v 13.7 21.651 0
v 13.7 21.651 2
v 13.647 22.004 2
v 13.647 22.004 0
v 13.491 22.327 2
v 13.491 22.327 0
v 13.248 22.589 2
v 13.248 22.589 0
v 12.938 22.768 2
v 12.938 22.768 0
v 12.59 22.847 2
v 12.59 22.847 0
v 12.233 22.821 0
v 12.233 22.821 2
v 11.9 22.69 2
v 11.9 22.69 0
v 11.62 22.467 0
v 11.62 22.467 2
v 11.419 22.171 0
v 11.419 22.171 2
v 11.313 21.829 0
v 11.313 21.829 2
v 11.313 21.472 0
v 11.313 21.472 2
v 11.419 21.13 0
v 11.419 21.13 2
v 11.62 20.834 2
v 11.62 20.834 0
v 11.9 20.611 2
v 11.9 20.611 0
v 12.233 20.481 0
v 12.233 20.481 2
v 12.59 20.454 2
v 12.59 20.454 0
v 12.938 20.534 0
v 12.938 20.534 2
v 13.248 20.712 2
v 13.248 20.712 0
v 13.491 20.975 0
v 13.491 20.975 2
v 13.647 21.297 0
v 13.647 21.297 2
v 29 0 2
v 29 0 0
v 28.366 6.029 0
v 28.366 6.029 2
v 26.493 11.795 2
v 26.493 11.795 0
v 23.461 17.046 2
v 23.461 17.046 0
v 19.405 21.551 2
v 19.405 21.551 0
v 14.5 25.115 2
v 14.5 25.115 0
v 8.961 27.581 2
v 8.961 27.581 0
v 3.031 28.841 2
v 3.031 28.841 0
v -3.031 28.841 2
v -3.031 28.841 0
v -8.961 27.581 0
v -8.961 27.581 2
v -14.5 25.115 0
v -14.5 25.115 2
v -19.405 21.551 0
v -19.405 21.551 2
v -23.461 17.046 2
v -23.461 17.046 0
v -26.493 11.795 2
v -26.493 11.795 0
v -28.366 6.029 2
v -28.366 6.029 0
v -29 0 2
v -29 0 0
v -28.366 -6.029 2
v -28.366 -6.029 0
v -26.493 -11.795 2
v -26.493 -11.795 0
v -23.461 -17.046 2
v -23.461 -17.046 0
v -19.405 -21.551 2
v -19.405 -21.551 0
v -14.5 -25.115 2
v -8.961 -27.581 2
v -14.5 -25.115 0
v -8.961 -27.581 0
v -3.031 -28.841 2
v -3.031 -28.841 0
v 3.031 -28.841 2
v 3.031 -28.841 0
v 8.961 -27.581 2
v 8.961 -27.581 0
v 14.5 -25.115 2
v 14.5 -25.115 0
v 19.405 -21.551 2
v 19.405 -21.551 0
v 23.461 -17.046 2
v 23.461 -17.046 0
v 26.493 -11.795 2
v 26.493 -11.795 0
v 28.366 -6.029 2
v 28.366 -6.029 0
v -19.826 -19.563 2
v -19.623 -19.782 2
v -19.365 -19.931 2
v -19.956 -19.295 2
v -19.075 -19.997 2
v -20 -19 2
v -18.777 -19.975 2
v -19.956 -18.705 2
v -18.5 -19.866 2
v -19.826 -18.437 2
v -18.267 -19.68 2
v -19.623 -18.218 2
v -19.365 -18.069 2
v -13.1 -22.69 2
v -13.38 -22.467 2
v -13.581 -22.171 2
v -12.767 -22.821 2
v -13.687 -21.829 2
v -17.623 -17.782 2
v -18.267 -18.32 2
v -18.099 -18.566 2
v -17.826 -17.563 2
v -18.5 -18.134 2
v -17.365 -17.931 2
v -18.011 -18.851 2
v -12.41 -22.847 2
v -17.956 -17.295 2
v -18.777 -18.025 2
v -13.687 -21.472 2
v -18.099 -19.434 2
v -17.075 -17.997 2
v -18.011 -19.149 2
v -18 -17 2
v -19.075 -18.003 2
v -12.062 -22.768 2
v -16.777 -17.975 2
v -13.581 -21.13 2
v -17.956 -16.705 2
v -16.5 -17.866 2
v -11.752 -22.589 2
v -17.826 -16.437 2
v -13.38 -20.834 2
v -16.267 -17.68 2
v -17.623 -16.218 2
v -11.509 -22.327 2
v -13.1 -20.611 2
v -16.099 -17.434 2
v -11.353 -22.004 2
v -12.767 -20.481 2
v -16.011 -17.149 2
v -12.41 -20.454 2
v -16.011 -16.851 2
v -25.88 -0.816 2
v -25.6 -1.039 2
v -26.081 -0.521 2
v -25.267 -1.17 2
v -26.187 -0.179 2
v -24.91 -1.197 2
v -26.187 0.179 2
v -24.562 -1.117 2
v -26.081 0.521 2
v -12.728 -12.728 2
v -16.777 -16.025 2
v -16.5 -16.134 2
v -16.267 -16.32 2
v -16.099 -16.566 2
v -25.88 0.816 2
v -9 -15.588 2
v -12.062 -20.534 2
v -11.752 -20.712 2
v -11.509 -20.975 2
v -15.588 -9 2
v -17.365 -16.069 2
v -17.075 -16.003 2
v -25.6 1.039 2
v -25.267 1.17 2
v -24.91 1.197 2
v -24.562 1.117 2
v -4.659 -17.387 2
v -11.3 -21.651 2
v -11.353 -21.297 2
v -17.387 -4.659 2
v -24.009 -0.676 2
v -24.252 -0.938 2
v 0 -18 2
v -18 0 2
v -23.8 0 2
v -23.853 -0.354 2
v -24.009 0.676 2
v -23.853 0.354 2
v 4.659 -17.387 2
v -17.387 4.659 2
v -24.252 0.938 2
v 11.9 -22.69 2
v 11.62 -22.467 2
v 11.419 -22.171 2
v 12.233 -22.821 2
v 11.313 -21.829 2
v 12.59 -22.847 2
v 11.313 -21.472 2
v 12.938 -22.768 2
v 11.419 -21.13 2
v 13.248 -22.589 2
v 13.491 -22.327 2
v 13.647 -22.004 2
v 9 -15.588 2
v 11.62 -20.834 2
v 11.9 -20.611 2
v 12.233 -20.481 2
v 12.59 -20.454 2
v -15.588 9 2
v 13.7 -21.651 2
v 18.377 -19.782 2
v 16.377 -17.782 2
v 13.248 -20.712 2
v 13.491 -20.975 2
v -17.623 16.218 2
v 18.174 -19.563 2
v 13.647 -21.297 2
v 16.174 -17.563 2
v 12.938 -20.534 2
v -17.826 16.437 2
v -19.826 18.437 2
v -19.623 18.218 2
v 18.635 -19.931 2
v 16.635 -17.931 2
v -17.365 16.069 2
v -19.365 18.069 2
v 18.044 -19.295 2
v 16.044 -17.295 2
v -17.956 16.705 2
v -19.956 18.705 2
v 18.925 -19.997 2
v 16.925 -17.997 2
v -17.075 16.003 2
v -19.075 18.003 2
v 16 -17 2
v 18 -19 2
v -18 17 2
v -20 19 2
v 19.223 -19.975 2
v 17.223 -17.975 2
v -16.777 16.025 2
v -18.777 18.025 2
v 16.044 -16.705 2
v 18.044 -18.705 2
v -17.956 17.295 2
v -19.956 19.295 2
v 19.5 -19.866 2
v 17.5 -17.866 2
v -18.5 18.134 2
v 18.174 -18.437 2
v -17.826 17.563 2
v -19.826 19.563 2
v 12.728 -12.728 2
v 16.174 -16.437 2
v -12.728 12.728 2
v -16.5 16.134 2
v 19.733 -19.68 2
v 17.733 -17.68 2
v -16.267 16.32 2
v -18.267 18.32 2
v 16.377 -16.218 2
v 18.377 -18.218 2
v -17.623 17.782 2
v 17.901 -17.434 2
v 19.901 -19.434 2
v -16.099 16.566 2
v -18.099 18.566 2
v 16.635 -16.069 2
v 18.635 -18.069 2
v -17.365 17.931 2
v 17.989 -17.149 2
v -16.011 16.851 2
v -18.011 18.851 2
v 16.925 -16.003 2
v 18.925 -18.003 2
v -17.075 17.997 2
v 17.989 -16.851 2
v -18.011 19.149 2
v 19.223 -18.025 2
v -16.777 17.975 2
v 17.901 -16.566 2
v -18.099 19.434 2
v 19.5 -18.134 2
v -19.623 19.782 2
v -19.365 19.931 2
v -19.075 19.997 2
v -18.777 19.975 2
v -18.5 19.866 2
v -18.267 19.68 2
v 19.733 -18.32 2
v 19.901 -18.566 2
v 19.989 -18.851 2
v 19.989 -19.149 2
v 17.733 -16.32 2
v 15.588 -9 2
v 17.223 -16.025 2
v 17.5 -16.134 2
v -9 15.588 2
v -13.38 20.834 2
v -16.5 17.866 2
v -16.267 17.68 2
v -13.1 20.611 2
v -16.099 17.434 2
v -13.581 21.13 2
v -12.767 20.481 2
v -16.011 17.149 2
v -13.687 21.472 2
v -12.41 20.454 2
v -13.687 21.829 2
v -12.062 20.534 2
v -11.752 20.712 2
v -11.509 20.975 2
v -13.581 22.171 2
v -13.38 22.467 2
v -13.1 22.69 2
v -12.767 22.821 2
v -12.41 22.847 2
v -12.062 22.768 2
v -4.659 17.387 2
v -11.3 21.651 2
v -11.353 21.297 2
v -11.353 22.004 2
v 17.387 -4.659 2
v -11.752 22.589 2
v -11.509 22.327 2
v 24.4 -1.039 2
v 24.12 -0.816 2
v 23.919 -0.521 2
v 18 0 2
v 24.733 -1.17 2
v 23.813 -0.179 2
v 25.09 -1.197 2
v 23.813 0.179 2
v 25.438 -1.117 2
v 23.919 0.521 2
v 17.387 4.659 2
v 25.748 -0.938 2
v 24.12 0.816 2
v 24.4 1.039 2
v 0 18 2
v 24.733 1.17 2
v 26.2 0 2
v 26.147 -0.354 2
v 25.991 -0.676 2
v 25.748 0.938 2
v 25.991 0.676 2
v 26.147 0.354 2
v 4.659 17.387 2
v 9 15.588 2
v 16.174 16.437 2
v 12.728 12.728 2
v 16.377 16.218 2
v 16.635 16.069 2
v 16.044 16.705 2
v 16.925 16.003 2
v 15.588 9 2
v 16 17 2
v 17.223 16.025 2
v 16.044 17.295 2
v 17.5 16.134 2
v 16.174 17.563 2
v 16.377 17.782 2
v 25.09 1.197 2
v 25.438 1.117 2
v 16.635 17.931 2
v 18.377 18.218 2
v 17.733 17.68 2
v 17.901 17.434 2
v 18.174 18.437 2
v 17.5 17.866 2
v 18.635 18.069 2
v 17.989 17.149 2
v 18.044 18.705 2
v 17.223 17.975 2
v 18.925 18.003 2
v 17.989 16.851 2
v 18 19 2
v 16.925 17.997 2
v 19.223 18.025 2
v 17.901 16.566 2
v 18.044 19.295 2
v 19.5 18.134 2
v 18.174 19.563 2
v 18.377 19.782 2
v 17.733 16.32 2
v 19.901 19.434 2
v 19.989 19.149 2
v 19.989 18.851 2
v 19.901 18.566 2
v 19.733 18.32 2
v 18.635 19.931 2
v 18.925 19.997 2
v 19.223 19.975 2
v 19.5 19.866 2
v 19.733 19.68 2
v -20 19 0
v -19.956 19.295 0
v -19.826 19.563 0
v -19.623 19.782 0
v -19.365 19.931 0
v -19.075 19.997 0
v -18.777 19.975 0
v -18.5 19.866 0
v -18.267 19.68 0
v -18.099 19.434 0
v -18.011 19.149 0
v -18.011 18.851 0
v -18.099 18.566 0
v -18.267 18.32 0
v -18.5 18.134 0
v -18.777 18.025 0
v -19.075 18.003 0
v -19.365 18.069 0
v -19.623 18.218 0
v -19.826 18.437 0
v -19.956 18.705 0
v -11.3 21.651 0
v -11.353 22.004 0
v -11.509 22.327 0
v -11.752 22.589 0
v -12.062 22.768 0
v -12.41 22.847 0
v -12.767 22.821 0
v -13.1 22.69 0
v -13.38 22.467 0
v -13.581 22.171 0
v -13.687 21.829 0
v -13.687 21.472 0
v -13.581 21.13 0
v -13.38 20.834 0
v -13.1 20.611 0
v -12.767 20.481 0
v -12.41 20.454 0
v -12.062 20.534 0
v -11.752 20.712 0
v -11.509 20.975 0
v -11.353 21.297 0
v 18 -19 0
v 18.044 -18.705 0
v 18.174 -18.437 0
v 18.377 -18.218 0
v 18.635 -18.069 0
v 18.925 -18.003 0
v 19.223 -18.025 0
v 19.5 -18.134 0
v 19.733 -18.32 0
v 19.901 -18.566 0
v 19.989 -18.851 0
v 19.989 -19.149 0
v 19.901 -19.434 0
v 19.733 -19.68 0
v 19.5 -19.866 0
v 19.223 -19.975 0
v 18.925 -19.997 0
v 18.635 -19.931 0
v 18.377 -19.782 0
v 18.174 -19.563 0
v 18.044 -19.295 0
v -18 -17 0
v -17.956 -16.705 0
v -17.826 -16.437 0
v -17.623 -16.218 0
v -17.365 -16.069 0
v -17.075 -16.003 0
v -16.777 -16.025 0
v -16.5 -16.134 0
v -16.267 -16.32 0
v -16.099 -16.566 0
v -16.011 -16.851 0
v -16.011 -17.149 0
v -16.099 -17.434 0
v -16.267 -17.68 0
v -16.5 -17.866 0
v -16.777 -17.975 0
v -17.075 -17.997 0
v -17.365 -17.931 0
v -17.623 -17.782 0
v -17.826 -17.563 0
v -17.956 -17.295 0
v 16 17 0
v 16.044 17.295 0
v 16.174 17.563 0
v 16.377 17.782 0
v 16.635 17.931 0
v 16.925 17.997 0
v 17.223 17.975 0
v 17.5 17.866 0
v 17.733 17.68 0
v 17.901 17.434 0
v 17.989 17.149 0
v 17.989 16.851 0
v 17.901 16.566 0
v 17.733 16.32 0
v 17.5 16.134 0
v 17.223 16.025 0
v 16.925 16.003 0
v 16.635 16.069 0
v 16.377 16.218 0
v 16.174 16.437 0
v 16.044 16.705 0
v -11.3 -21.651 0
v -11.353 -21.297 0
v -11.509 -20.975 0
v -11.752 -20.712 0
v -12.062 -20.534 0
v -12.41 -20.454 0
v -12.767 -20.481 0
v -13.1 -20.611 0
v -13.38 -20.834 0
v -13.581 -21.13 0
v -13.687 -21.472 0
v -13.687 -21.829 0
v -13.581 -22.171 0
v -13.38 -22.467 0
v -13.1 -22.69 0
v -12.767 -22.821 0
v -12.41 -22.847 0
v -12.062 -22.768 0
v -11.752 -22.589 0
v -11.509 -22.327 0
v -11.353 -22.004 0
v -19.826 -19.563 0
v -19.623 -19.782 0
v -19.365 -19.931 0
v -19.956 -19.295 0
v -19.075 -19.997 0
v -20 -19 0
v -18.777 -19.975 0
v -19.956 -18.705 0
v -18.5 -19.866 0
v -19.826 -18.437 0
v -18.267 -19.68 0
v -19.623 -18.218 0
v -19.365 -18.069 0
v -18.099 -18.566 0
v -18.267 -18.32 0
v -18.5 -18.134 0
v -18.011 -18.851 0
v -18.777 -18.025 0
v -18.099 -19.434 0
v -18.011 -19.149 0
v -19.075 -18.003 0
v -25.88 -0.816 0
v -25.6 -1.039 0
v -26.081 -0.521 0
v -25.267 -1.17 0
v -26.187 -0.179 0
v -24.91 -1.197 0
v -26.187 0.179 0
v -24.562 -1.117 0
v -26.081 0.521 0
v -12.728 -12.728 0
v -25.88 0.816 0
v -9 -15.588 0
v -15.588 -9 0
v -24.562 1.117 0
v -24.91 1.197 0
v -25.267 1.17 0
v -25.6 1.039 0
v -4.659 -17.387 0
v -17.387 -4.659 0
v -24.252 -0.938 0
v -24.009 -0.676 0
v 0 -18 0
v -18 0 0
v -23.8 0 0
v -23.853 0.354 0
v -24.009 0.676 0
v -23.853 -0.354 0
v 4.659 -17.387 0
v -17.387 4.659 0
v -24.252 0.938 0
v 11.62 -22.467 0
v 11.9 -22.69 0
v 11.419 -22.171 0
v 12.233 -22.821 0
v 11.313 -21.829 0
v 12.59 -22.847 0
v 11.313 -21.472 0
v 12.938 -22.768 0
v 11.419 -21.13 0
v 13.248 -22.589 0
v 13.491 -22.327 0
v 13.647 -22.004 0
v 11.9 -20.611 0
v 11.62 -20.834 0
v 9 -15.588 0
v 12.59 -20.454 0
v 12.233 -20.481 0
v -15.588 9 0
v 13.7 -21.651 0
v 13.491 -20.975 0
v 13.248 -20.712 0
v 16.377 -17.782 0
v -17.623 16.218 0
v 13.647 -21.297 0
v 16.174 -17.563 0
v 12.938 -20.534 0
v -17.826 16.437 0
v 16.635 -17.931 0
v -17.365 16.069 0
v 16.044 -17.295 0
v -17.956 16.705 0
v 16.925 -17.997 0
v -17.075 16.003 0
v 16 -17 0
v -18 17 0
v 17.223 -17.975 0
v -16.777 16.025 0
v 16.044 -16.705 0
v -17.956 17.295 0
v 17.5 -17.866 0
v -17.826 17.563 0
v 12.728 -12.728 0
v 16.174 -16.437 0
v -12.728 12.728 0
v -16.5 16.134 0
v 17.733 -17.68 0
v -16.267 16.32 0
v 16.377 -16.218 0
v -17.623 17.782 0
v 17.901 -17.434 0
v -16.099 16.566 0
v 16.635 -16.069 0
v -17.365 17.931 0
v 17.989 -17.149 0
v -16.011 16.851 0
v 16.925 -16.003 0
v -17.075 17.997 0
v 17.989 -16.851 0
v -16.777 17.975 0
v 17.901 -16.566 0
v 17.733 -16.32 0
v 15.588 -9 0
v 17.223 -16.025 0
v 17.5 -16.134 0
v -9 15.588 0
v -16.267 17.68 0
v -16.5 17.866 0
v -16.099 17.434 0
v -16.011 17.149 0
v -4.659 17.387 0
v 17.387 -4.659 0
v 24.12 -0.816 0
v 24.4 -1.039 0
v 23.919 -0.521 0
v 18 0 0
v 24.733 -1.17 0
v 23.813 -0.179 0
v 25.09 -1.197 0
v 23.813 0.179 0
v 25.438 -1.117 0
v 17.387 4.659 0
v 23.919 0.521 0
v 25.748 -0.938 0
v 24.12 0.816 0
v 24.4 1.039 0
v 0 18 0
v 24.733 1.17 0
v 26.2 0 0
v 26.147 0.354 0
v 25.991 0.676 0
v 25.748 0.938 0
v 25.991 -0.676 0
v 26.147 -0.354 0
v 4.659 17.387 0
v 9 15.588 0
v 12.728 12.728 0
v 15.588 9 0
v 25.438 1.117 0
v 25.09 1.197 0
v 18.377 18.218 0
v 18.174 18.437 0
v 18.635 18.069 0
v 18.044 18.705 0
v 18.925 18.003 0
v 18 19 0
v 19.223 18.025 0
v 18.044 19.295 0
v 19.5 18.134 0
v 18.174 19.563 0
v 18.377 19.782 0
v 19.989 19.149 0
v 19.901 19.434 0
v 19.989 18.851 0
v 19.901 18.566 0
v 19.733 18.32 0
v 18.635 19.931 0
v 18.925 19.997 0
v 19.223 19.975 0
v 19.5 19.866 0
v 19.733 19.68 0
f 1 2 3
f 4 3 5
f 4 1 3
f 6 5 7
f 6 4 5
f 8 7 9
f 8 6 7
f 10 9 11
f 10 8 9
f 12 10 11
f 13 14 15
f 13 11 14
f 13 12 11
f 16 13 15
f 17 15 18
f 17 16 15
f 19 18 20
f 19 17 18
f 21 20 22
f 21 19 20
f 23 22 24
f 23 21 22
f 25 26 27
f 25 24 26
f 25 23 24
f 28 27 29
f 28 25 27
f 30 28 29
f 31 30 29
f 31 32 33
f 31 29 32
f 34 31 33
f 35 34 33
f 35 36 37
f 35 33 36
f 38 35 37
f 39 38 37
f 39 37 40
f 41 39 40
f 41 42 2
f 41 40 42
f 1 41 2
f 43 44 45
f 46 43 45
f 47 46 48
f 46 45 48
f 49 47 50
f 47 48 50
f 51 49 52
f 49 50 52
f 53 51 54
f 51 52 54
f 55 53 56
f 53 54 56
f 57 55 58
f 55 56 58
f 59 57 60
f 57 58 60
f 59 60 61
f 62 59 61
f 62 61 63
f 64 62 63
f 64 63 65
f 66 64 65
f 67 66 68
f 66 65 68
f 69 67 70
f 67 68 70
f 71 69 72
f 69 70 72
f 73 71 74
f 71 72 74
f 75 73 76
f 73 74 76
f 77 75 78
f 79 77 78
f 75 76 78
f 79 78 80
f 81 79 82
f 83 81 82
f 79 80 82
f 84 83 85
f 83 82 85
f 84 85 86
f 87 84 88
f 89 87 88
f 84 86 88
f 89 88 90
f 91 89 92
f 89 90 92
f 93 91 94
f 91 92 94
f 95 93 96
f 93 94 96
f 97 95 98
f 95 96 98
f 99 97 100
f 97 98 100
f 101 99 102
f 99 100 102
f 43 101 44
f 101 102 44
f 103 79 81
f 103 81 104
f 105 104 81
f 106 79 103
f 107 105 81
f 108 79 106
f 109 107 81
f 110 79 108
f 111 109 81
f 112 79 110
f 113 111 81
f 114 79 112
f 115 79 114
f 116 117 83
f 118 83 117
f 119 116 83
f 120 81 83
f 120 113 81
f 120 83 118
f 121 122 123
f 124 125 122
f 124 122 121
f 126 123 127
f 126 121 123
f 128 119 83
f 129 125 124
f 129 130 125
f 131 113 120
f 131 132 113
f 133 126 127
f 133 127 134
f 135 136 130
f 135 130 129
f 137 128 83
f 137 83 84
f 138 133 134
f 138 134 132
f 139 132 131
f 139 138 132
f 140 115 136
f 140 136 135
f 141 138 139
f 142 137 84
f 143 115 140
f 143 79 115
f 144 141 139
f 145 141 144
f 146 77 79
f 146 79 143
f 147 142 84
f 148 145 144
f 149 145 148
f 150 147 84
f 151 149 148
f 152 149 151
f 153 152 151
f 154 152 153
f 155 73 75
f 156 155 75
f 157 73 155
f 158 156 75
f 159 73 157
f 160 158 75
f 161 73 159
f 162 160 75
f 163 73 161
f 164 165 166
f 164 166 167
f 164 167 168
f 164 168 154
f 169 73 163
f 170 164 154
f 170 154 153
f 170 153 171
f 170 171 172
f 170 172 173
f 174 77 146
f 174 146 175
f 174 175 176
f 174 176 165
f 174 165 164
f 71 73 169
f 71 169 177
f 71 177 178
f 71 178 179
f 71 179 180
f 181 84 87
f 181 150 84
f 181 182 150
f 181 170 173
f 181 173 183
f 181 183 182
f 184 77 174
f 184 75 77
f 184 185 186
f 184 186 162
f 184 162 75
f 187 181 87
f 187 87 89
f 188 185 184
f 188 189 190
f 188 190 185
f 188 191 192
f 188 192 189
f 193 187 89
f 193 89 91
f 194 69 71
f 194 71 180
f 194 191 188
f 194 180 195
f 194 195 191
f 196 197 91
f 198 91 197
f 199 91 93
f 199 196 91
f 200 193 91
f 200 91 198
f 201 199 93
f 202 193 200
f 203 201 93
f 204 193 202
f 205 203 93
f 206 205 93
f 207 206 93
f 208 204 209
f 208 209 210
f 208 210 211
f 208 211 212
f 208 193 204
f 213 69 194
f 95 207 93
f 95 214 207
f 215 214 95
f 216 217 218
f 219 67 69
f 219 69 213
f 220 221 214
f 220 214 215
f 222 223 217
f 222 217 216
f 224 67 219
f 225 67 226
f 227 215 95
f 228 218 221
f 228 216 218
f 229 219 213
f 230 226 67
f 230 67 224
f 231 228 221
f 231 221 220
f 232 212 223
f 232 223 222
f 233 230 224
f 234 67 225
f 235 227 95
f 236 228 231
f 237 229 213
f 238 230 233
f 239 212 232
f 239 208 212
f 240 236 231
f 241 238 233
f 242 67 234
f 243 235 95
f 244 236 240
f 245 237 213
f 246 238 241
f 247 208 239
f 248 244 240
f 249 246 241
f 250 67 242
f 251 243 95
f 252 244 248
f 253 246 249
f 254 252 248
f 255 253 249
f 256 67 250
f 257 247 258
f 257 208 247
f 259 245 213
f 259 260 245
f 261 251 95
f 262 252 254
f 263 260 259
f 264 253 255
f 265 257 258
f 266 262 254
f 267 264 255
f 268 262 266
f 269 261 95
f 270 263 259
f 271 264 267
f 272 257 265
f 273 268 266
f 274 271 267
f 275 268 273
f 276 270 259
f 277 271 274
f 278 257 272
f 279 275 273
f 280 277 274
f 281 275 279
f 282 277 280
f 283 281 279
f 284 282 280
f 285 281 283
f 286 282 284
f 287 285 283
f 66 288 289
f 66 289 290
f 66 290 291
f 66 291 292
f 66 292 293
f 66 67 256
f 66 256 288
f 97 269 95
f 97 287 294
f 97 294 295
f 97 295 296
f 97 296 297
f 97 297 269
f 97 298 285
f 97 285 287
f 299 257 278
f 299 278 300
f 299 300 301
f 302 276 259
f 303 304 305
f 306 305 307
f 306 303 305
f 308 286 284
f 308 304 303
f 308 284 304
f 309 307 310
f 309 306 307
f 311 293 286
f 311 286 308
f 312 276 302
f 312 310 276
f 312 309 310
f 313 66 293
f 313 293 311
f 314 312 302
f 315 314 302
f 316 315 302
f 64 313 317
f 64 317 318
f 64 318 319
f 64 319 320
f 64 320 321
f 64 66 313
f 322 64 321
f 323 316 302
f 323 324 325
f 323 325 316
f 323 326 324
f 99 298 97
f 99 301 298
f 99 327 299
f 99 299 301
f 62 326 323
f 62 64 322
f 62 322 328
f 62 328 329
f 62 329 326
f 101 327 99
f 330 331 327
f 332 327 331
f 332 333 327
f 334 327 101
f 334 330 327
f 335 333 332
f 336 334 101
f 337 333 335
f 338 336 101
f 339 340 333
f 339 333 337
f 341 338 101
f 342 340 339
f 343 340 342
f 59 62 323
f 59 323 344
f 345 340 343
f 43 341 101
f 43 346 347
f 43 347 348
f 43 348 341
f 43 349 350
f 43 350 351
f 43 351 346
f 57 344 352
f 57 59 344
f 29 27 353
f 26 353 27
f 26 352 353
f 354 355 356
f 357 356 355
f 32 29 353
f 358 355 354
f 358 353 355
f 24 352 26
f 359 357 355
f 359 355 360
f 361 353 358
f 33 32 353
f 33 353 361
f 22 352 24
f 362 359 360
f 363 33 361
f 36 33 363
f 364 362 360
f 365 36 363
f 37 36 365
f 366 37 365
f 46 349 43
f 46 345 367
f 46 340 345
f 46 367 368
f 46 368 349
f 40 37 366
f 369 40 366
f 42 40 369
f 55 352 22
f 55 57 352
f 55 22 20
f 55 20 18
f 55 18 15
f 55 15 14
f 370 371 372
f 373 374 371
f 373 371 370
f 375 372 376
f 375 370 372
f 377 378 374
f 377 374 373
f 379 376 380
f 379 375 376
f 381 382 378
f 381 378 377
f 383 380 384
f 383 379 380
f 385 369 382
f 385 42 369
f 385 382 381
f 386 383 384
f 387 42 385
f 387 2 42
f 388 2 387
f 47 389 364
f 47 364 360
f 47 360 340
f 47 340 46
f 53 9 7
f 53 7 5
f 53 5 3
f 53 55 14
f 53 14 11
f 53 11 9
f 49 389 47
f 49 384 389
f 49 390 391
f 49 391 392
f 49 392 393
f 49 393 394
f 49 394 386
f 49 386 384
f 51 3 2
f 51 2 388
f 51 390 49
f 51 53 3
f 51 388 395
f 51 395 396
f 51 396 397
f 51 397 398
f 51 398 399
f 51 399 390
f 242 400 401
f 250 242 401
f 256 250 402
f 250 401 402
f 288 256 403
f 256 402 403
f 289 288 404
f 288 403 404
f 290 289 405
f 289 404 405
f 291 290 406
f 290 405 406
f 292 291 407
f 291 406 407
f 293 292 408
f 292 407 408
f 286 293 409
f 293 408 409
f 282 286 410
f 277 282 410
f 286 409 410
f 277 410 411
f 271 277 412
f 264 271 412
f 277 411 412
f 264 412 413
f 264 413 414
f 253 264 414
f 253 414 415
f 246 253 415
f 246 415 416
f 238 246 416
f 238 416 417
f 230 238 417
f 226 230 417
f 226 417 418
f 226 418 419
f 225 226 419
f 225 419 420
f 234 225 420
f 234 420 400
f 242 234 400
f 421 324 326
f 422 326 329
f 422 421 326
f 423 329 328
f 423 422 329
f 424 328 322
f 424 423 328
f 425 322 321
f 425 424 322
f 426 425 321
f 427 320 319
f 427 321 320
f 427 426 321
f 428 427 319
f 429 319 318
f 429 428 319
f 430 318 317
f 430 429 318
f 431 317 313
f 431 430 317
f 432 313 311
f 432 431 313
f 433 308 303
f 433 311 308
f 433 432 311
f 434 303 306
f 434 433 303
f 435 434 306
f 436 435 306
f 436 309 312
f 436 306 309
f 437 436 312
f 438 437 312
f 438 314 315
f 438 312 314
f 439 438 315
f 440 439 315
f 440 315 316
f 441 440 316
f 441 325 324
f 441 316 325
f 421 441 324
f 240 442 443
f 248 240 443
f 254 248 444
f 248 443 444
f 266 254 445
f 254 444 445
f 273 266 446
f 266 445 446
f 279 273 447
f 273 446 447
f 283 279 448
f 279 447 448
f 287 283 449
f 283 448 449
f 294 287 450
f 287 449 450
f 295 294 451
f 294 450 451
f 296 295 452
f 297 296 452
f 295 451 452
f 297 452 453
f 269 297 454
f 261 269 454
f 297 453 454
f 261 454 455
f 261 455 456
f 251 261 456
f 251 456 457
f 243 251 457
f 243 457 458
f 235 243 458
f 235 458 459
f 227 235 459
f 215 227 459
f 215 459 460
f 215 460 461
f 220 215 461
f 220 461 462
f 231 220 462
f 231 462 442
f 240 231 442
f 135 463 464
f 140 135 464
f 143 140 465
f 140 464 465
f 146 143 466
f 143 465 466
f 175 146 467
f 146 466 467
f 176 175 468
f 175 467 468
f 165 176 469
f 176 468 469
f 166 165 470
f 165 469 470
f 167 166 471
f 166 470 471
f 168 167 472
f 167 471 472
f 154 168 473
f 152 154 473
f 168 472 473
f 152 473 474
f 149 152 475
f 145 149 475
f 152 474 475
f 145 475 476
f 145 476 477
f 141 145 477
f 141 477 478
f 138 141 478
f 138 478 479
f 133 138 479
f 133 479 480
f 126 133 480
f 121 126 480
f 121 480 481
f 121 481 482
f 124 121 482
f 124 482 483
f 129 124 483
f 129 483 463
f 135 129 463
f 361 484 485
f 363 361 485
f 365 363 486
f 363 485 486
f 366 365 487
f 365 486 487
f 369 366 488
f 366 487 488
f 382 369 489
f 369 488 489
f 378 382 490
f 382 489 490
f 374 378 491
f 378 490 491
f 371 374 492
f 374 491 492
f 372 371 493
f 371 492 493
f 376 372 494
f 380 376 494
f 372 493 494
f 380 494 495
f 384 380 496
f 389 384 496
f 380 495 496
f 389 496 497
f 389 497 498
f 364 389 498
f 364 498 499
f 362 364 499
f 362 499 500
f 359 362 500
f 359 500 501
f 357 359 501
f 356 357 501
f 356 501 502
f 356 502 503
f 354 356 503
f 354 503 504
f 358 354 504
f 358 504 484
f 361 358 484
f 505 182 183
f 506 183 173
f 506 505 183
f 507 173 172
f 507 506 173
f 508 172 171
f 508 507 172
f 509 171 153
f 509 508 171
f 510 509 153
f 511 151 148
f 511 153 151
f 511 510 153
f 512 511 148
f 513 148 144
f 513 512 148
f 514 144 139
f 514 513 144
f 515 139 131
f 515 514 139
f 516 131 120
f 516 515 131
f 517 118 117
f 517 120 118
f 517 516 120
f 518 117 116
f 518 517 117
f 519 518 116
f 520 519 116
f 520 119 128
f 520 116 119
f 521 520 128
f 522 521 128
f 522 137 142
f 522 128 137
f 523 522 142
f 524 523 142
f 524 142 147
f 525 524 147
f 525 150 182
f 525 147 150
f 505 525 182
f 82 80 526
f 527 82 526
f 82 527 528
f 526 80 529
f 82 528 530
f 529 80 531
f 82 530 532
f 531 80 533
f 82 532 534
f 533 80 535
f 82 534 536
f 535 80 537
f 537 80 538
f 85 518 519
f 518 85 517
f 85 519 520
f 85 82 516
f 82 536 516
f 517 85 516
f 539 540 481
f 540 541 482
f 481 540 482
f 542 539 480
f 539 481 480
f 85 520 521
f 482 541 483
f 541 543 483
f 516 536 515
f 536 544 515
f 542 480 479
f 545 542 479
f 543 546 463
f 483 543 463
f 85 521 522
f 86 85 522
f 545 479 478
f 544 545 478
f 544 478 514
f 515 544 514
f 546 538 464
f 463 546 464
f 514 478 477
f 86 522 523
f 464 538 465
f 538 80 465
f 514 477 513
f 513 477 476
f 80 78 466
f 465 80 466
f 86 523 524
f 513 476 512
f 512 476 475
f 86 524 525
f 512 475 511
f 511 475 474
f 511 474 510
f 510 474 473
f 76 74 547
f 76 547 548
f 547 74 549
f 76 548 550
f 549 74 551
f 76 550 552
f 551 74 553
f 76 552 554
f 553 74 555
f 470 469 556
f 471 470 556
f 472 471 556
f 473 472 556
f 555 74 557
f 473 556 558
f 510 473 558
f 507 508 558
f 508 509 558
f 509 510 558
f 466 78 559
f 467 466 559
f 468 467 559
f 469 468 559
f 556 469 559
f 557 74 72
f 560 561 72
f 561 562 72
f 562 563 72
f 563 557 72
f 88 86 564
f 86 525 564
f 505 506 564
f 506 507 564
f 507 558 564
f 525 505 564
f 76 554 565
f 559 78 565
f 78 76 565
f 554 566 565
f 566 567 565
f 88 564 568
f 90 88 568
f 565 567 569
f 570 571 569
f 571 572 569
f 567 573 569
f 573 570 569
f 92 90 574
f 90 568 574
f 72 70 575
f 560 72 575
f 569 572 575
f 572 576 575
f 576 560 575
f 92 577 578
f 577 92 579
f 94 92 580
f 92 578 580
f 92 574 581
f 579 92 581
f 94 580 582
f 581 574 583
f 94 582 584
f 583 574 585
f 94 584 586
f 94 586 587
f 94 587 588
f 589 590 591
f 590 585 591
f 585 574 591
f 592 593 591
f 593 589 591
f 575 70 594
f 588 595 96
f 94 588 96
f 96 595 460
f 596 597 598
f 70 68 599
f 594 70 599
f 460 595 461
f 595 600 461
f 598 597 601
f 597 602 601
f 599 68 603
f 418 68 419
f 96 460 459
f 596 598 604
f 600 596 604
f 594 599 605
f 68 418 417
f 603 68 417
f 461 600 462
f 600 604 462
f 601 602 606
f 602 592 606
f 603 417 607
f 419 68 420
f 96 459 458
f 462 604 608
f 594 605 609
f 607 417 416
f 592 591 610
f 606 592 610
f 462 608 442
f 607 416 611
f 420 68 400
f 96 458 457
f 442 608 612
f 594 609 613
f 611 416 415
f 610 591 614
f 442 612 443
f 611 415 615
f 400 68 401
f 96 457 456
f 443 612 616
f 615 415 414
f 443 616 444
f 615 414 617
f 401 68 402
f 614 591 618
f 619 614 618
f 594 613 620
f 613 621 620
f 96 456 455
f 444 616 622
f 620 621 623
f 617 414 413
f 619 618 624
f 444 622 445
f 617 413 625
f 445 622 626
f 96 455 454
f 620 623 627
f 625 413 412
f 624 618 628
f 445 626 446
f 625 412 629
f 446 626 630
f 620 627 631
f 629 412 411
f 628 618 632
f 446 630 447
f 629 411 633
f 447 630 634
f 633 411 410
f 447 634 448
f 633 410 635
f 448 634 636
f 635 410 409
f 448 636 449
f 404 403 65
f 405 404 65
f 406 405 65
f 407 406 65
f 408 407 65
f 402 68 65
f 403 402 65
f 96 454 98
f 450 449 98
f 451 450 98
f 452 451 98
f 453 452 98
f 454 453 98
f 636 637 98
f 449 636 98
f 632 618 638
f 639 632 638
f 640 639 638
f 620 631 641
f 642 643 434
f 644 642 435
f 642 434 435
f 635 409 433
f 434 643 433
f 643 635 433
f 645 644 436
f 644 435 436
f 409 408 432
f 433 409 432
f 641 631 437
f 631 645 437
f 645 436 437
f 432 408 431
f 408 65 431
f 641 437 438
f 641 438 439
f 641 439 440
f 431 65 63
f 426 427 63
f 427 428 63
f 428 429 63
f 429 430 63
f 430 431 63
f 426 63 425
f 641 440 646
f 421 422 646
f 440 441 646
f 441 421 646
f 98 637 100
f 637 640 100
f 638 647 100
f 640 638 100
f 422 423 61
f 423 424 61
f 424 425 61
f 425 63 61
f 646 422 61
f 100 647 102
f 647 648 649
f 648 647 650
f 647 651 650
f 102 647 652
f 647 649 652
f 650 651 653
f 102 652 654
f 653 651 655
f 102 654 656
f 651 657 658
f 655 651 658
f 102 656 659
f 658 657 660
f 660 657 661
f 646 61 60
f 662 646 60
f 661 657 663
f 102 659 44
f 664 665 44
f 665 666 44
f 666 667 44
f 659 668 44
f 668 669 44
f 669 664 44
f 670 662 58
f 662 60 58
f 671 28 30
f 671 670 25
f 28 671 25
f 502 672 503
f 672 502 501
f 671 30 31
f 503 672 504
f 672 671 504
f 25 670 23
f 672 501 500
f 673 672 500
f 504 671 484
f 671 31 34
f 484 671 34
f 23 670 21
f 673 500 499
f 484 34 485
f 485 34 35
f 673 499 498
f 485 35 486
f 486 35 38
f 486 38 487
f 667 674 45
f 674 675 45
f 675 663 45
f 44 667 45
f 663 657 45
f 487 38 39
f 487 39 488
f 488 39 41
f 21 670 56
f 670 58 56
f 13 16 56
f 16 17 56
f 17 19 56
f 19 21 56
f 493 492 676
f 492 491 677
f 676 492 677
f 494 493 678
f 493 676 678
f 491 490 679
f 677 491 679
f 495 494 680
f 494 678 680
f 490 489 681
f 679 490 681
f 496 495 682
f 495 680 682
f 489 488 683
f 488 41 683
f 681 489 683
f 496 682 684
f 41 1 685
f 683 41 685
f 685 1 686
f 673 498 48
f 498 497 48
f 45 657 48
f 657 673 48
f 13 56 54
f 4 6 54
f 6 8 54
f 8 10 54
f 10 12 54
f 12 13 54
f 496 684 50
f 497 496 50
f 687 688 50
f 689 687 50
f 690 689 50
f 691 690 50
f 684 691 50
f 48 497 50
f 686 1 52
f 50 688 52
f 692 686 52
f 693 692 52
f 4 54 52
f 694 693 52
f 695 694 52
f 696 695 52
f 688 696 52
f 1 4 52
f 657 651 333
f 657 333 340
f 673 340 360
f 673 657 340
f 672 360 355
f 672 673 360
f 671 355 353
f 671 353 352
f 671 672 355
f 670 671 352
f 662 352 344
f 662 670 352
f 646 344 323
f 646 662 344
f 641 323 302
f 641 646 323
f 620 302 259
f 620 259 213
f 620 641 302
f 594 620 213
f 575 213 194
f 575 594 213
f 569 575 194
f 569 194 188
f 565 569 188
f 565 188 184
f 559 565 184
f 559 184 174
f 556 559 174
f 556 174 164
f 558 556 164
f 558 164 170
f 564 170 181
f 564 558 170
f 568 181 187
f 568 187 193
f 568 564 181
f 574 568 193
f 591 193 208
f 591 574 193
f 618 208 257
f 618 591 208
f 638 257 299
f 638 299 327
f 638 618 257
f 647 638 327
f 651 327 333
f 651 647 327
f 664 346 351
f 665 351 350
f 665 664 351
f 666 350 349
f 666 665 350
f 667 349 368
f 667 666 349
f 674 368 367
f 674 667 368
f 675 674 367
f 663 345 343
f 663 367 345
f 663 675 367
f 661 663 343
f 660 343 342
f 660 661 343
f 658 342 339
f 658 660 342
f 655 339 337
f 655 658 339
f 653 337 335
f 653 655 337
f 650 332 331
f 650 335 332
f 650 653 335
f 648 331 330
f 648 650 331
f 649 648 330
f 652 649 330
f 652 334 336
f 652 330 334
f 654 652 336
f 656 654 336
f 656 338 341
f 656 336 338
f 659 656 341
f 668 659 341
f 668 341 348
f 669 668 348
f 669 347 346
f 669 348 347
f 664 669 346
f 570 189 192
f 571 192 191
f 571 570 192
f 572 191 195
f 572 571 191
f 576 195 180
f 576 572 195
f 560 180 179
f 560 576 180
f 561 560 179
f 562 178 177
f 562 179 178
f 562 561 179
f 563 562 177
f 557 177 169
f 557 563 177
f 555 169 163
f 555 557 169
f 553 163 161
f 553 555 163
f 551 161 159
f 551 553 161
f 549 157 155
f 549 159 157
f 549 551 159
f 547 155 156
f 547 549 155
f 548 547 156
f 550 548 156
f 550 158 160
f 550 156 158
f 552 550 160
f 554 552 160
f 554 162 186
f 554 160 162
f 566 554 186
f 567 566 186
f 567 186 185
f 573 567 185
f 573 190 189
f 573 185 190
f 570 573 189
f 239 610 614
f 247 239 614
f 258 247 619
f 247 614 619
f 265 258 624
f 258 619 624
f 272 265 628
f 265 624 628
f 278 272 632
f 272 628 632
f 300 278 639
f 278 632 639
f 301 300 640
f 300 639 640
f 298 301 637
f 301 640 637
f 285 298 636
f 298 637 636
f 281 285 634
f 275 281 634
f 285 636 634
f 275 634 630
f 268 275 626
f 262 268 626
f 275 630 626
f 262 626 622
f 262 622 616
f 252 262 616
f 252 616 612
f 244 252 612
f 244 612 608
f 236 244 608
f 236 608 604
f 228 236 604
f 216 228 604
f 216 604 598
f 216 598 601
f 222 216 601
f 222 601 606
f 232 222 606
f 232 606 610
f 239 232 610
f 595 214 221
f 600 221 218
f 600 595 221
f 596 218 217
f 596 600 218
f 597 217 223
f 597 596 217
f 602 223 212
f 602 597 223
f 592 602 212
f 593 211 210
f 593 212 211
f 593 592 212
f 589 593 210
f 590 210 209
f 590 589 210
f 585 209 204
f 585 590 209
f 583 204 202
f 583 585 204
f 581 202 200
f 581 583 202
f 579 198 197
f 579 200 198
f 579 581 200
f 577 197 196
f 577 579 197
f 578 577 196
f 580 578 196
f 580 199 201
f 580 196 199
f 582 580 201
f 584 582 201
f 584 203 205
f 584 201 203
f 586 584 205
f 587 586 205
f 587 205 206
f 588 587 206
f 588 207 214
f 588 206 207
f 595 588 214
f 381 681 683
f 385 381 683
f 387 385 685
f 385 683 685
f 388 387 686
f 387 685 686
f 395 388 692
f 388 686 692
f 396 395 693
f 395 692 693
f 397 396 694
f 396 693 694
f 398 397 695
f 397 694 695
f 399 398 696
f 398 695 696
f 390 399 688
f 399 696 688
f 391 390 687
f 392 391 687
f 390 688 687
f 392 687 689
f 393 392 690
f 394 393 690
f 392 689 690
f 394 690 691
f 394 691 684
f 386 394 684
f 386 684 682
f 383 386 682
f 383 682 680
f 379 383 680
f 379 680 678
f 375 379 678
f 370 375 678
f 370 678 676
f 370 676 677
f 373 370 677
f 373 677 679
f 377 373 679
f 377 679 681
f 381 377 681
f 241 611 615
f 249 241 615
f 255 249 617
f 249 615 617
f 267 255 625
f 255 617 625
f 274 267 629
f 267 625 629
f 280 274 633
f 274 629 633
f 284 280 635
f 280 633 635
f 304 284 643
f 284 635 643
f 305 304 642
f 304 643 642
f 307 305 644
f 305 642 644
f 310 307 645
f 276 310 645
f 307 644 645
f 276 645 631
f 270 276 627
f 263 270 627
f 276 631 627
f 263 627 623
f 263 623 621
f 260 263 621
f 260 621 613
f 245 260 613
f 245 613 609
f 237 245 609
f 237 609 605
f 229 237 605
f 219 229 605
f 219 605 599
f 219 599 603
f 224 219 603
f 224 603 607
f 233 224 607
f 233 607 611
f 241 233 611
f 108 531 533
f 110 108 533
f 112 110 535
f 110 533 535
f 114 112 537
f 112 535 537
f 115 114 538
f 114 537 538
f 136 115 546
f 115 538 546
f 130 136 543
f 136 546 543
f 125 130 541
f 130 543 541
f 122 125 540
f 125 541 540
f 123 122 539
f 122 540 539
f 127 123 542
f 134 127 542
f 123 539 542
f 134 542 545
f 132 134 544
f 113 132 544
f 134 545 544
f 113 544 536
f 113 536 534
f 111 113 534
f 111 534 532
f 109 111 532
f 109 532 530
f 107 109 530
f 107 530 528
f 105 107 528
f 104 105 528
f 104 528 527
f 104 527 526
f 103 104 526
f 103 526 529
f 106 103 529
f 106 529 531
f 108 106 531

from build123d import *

# Parameters (mm, degrees)
SKETCH1_R             = 18
BOSS_EXTRUDE1_DEPTH   = 2
F_2_0MM_DOWEL_HOLE1_D = 2
SKETCH5_R             = 1.2
CUT_EXTRUDE4_DEPTH    = 42.060930335


with BuildPart() as part:
    # Sketch1 → Boss-Extrude1 (new body)
    with BuildSketch(Plane.XY):
        with BuildLine():
            ThreePointArc((-29, 0), (0, -29), (29, 0))
            ThreePointArc((29, 0), (0, 29), (-29, 0))
        make_face()
        Circle(SKETCH1_R, mode=Mode.SUBTRACT)
    extrude(amount=BOSS_EXTRUDE1_DEPTH)

    # Ø2.0mm Dowel Hole1 (through all)
    with Locations(Plane(origin=(-19, 19, 2), x_dir=(1, 0, 0), z_dir=(0, 0, 1))):
        with Locations((0, 0), (2, -2), (36, -2), (38, 0), (36, -36), (38, -38), (0, -38), (2, -36)):
            Hole(F_2_0MM_DOWEL_HOLE1_D / 2)

    # Sketch5 → Cut-Extrude4 (cut, through all)
    with BuildSketch(Plane.XY):
        with Locations((-12.5, 21.650635095)):
            Circle(SKETCH5_R)
        with Locations((-25, 0)):
            Circle(SKETCH5_R)
        with Locations((25, 0)):
            Circle(SKETCH5_R)
        with Locations((-12.5, -21.650635095)):
            Circle(SKETCH5_R)
        with Locations((12.5, 21.650635095)):
            Circle(SKETCH5_R)
        with Locations((12.5, -21.650635095)):
            Circle(SKETCH5_R)
    extrude(amount=CUT_EXTRUDE4_DEPTH, mode=Mode.SUBTRACT)


solid = part.part
